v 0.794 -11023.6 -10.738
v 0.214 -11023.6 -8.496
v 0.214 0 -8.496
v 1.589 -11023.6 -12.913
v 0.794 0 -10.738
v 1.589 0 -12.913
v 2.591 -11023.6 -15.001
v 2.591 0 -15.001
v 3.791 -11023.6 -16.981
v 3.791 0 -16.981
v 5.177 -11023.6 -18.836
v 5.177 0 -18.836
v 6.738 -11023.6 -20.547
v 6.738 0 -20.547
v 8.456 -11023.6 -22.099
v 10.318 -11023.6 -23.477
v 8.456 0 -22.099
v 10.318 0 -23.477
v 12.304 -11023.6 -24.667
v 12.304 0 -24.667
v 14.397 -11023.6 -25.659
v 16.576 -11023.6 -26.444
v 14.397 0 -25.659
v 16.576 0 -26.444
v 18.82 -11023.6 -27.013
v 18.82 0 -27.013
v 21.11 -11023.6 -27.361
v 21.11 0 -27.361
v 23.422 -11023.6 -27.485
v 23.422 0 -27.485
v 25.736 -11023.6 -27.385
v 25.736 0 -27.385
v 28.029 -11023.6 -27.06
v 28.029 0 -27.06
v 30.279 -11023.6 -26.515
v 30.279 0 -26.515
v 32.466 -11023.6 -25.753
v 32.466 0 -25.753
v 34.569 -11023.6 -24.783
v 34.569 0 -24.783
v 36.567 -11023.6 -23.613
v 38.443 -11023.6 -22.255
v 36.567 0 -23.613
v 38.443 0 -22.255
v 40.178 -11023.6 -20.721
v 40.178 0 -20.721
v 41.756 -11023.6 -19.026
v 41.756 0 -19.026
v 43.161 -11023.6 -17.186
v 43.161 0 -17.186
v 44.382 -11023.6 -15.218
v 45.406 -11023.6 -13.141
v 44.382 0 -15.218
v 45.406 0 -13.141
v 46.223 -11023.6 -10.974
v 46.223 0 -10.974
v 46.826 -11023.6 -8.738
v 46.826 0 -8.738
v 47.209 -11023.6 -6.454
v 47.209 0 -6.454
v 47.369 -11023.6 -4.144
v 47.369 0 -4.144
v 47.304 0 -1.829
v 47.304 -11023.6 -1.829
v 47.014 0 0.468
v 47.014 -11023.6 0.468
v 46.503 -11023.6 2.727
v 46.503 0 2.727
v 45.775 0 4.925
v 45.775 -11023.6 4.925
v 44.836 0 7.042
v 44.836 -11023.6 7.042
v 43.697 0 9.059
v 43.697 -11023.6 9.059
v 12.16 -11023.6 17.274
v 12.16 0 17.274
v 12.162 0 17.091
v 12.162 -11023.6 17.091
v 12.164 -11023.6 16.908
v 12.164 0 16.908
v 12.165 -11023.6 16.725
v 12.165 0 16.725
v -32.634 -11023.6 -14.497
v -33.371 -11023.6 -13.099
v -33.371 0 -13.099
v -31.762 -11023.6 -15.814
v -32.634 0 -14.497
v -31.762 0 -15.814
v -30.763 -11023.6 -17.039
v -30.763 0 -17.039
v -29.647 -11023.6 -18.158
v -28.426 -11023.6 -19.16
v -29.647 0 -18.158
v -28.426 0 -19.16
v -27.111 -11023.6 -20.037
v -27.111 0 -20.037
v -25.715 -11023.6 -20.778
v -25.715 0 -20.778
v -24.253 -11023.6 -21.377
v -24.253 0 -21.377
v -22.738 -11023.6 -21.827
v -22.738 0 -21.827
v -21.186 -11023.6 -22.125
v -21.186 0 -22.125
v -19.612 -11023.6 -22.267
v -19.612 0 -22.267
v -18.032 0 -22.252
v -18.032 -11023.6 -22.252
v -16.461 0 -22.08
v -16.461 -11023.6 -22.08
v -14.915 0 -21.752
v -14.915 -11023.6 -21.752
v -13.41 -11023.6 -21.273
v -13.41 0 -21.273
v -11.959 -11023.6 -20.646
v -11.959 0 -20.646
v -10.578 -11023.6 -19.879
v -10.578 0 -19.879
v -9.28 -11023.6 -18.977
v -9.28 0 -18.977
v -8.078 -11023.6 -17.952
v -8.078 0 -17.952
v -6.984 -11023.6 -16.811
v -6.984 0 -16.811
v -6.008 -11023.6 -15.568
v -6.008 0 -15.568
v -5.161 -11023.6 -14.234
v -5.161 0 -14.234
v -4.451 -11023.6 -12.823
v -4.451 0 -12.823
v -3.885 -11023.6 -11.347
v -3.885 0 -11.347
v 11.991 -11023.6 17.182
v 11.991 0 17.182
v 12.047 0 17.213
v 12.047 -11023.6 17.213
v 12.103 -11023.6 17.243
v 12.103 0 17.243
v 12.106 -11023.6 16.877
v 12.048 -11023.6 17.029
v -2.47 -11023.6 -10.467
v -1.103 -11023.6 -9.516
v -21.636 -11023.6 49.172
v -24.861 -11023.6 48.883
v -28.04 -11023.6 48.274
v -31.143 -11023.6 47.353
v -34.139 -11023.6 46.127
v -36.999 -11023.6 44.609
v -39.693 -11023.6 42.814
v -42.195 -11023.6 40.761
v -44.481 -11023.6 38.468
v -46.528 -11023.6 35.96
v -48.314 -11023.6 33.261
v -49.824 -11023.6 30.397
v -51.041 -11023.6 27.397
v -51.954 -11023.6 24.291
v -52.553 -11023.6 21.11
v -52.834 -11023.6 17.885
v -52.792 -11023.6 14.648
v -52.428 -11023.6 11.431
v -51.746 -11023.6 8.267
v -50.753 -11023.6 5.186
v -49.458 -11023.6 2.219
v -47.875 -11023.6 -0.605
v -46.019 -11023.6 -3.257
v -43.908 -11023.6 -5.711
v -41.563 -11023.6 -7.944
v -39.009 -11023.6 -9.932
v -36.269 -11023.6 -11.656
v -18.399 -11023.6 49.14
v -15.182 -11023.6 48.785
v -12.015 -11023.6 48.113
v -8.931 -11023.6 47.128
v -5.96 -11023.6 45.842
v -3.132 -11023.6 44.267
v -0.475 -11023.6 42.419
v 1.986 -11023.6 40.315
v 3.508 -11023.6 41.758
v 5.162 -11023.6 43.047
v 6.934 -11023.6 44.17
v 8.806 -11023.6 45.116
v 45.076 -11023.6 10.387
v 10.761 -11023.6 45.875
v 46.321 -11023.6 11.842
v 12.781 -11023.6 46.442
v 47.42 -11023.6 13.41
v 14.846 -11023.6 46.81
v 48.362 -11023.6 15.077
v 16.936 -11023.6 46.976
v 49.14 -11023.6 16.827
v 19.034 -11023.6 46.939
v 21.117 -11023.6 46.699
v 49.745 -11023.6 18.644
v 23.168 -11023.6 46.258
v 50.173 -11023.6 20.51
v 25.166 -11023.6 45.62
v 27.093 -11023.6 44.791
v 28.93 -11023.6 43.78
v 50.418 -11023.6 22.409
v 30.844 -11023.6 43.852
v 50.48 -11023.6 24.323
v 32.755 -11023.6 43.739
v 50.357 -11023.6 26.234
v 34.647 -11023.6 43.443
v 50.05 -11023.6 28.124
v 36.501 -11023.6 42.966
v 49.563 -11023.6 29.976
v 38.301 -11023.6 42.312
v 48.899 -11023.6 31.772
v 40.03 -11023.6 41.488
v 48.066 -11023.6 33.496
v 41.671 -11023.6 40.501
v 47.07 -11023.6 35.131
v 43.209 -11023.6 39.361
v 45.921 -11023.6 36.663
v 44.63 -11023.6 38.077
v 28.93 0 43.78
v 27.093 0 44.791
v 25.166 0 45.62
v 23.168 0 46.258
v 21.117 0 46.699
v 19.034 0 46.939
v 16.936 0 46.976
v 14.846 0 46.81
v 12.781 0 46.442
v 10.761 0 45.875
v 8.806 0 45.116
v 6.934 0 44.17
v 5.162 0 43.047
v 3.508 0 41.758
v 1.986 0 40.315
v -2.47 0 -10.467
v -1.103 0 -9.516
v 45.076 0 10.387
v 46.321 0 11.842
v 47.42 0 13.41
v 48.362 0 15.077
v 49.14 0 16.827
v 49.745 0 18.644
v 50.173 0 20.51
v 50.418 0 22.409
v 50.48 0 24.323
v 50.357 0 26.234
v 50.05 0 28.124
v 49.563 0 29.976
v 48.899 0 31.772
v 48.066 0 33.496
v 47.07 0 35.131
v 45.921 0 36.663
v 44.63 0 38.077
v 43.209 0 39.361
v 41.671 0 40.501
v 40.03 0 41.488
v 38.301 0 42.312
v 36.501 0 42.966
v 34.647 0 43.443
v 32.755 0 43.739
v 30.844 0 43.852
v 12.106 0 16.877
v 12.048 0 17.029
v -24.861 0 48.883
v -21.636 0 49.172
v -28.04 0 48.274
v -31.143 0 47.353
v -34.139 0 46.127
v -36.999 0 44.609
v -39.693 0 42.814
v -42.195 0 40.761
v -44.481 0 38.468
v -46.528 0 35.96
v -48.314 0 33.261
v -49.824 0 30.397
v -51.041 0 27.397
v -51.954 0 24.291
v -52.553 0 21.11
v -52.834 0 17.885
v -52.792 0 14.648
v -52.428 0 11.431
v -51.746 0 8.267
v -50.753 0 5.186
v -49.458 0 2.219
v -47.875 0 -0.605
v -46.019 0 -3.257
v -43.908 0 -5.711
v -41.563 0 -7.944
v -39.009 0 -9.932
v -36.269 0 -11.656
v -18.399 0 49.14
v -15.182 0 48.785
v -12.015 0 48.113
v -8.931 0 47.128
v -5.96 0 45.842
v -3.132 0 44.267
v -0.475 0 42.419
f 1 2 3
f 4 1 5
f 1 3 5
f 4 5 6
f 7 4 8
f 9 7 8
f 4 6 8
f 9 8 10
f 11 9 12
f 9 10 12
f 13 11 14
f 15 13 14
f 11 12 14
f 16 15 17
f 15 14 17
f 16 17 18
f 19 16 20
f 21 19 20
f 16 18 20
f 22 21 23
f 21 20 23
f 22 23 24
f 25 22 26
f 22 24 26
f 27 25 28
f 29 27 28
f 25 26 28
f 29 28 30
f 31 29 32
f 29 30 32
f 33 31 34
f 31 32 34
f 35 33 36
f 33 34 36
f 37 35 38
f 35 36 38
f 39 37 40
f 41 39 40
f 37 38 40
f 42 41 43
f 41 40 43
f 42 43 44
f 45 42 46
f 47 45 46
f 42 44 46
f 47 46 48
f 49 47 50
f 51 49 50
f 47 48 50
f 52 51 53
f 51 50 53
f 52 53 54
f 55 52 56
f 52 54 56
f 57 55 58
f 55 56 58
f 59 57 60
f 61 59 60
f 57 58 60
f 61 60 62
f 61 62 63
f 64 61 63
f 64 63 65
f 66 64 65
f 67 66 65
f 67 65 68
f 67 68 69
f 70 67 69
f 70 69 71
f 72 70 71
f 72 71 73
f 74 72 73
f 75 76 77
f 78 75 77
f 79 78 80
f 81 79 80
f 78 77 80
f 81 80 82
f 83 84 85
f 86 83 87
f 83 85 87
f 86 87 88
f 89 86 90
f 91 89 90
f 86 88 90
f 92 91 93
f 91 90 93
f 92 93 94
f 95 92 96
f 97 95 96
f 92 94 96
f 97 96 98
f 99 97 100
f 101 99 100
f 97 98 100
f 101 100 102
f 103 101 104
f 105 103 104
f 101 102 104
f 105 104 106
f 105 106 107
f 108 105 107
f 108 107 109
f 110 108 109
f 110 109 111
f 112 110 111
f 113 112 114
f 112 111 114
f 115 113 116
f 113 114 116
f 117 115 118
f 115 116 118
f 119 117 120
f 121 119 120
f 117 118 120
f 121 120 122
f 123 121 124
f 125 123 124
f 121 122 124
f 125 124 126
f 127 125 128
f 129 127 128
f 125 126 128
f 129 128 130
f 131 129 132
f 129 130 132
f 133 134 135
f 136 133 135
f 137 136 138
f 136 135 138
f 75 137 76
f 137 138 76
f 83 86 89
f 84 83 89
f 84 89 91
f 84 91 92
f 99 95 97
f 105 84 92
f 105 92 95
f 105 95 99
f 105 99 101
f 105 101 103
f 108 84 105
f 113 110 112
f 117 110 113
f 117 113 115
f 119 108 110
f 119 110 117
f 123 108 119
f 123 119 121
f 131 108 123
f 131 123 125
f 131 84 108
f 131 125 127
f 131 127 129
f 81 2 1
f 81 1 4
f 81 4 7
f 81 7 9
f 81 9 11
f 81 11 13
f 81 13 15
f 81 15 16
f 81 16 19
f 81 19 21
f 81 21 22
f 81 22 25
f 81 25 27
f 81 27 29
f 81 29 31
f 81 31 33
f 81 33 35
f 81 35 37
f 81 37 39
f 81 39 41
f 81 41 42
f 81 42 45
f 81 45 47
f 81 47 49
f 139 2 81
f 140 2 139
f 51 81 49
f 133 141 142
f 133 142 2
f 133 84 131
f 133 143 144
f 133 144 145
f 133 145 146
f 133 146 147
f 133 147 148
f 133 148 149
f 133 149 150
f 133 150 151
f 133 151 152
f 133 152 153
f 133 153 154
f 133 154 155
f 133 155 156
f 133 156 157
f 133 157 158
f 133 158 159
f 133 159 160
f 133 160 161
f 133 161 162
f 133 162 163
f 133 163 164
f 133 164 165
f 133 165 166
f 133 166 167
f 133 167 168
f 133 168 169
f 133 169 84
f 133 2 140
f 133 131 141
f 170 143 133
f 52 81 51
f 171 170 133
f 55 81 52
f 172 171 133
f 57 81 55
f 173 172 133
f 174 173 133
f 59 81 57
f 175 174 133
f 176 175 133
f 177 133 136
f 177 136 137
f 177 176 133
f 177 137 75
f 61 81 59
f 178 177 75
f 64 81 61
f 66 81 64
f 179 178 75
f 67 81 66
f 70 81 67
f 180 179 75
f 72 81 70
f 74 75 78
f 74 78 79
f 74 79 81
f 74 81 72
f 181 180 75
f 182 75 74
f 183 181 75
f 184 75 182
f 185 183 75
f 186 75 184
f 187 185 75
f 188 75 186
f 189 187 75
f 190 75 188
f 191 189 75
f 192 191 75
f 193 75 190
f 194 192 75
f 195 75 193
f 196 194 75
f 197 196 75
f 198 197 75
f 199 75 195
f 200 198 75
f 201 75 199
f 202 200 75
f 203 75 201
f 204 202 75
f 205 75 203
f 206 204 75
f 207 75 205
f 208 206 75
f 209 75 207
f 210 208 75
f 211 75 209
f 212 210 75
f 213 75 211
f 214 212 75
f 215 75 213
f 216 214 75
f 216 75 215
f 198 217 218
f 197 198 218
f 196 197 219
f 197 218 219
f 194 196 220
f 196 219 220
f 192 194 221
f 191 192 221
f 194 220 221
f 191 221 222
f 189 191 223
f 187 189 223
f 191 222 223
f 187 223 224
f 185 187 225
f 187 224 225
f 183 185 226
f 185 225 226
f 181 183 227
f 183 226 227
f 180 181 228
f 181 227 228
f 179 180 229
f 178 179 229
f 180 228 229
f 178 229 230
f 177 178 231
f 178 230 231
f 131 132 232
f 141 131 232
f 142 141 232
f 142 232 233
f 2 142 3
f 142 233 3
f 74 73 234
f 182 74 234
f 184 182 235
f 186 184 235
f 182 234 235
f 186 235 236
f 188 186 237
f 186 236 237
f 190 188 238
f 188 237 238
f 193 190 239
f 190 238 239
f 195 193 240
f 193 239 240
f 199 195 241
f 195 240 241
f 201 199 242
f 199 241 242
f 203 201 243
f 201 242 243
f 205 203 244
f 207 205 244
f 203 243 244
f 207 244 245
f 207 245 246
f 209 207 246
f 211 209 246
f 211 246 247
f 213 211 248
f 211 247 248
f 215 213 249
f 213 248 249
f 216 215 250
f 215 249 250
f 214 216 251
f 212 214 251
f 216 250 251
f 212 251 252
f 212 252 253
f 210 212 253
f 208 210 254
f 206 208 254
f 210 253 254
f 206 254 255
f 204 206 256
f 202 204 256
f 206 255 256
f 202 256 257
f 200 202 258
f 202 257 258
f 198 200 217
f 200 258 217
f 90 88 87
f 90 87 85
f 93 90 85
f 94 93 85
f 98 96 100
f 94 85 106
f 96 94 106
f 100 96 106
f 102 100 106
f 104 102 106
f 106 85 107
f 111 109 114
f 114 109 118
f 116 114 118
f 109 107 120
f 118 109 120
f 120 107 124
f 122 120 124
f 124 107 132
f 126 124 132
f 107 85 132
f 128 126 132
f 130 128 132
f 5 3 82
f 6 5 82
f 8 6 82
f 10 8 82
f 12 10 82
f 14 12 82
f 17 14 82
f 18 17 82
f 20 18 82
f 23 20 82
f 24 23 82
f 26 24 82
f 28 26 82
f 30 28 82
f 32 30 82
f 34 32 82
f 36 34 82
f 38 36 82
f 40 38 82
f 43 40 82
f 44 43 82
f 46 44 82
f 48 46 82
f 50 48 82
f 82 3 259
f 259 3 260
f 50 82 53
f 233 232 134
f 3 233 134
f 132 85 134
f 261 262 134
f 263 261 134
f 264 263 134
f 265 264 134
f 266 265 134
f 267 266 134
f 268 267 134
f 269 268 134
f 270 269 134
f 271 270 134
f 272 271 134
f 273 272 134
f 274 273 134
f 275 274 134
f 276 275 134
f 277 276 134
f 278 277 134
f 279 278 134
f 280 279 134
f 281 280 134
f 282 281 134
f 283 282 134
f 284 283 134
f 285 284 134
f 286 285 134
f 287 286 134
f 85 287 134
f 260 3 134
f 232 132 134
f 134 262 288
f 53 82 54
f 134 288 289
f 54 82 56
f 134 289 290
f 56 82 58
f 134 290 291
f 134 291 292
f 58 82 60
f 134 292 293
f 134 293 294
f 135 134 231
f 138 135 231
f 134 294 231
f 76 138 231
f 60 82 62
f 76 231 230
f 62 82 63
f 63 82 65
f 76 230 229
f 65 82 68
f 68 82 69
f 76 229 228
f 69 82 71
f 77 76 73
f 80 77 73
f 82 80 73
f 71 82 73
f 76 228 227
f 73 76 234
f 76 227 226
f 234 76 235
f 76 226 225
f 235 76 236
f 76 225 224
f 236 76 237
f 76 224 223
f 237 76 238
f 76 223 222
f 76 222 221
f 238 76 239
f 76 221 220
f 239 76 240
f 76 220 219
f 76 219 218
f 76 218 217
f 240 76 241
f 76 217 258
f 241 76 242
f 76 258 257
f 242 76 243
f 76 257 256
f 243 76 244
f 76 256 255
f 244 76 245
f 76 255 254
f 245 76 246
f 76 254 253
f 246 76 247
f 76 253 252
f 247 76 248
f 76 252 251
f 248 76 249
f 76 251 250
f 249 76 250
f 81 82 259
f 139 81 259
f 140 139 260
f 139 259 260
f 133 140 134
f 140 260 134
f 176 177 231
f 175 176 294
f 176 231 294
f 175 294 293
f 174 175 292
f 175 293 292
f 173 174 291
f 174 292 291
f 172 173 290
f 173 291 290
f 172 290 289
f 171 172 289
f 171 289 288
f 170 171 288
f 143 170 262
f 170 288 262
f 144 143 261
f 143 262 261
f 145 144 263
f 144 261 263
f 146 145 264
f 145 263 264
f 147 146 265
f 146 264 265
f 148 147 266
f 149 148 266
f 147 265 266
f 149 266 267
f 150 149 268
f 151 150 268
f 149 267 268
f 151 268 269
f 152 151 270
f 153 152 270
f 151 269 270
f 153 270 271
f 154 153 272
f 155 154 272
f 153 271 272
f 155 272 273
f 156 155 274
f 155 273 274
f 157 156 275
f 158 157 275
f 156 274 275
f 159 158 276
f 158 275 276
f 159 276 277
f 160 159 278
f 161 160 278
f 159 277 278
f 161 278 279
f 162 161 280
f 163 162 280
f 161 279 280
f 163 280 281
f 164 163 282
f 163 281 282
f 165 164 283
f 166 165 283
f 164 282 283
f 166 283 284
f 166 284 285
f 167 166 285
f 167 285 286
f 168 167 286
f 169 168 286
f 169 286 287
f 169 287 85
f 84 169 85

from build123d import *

# Parameters (mm, degrees)
F1_DEPTH = 11023.6


with BuildPart() as f1:
    # F0 (on Front) → F1 (new body)
    with BuildSketch(Plane.XZ):
        with BuildLine():
            ThreePointArc((43.697246, 9.058607), (48.899054, 31.771814), (28.930249, 43.779951))
            ThreePointArc((28.930249, 43.779951), (14.845513, 46.810139), (1.985794, 40.314798))
            ThreePointArc((1.985794, 40.314798), (-47.454546, 34.632477), (-33.370999, -13.098957))
            ThreePointArc((-33.370999, -13.098957), (-18.032149, -22.251919), (-3.884838, -11.347304))
            ThreePointArc((-3.884838, -11.347304), (-1.78059, -10.000493), (0.214021, -8.496072))
            ThreePointArc((0.214021, -8.496072), (32.466019, -25.753129), (43.697246, 9.058607))
        make_face()
        with BuildLine():
            ThreePointArc((12.164843, 16.72465), (12.076617, 16.952613), (11.991205, 17.181644))
            ThreePointArc((11.991205, 17.181644), (12.075298, 17.228048), (12.159576, 17.274114))
            ThreePointArc((12.159576, 17.274114), (12.163371, 16.999393), (12.164843, 16.72465))
        make_face(mode=Mode.SUBTRACT)
    extrude(amount=F1_DEPTH)


solid = f1.part
